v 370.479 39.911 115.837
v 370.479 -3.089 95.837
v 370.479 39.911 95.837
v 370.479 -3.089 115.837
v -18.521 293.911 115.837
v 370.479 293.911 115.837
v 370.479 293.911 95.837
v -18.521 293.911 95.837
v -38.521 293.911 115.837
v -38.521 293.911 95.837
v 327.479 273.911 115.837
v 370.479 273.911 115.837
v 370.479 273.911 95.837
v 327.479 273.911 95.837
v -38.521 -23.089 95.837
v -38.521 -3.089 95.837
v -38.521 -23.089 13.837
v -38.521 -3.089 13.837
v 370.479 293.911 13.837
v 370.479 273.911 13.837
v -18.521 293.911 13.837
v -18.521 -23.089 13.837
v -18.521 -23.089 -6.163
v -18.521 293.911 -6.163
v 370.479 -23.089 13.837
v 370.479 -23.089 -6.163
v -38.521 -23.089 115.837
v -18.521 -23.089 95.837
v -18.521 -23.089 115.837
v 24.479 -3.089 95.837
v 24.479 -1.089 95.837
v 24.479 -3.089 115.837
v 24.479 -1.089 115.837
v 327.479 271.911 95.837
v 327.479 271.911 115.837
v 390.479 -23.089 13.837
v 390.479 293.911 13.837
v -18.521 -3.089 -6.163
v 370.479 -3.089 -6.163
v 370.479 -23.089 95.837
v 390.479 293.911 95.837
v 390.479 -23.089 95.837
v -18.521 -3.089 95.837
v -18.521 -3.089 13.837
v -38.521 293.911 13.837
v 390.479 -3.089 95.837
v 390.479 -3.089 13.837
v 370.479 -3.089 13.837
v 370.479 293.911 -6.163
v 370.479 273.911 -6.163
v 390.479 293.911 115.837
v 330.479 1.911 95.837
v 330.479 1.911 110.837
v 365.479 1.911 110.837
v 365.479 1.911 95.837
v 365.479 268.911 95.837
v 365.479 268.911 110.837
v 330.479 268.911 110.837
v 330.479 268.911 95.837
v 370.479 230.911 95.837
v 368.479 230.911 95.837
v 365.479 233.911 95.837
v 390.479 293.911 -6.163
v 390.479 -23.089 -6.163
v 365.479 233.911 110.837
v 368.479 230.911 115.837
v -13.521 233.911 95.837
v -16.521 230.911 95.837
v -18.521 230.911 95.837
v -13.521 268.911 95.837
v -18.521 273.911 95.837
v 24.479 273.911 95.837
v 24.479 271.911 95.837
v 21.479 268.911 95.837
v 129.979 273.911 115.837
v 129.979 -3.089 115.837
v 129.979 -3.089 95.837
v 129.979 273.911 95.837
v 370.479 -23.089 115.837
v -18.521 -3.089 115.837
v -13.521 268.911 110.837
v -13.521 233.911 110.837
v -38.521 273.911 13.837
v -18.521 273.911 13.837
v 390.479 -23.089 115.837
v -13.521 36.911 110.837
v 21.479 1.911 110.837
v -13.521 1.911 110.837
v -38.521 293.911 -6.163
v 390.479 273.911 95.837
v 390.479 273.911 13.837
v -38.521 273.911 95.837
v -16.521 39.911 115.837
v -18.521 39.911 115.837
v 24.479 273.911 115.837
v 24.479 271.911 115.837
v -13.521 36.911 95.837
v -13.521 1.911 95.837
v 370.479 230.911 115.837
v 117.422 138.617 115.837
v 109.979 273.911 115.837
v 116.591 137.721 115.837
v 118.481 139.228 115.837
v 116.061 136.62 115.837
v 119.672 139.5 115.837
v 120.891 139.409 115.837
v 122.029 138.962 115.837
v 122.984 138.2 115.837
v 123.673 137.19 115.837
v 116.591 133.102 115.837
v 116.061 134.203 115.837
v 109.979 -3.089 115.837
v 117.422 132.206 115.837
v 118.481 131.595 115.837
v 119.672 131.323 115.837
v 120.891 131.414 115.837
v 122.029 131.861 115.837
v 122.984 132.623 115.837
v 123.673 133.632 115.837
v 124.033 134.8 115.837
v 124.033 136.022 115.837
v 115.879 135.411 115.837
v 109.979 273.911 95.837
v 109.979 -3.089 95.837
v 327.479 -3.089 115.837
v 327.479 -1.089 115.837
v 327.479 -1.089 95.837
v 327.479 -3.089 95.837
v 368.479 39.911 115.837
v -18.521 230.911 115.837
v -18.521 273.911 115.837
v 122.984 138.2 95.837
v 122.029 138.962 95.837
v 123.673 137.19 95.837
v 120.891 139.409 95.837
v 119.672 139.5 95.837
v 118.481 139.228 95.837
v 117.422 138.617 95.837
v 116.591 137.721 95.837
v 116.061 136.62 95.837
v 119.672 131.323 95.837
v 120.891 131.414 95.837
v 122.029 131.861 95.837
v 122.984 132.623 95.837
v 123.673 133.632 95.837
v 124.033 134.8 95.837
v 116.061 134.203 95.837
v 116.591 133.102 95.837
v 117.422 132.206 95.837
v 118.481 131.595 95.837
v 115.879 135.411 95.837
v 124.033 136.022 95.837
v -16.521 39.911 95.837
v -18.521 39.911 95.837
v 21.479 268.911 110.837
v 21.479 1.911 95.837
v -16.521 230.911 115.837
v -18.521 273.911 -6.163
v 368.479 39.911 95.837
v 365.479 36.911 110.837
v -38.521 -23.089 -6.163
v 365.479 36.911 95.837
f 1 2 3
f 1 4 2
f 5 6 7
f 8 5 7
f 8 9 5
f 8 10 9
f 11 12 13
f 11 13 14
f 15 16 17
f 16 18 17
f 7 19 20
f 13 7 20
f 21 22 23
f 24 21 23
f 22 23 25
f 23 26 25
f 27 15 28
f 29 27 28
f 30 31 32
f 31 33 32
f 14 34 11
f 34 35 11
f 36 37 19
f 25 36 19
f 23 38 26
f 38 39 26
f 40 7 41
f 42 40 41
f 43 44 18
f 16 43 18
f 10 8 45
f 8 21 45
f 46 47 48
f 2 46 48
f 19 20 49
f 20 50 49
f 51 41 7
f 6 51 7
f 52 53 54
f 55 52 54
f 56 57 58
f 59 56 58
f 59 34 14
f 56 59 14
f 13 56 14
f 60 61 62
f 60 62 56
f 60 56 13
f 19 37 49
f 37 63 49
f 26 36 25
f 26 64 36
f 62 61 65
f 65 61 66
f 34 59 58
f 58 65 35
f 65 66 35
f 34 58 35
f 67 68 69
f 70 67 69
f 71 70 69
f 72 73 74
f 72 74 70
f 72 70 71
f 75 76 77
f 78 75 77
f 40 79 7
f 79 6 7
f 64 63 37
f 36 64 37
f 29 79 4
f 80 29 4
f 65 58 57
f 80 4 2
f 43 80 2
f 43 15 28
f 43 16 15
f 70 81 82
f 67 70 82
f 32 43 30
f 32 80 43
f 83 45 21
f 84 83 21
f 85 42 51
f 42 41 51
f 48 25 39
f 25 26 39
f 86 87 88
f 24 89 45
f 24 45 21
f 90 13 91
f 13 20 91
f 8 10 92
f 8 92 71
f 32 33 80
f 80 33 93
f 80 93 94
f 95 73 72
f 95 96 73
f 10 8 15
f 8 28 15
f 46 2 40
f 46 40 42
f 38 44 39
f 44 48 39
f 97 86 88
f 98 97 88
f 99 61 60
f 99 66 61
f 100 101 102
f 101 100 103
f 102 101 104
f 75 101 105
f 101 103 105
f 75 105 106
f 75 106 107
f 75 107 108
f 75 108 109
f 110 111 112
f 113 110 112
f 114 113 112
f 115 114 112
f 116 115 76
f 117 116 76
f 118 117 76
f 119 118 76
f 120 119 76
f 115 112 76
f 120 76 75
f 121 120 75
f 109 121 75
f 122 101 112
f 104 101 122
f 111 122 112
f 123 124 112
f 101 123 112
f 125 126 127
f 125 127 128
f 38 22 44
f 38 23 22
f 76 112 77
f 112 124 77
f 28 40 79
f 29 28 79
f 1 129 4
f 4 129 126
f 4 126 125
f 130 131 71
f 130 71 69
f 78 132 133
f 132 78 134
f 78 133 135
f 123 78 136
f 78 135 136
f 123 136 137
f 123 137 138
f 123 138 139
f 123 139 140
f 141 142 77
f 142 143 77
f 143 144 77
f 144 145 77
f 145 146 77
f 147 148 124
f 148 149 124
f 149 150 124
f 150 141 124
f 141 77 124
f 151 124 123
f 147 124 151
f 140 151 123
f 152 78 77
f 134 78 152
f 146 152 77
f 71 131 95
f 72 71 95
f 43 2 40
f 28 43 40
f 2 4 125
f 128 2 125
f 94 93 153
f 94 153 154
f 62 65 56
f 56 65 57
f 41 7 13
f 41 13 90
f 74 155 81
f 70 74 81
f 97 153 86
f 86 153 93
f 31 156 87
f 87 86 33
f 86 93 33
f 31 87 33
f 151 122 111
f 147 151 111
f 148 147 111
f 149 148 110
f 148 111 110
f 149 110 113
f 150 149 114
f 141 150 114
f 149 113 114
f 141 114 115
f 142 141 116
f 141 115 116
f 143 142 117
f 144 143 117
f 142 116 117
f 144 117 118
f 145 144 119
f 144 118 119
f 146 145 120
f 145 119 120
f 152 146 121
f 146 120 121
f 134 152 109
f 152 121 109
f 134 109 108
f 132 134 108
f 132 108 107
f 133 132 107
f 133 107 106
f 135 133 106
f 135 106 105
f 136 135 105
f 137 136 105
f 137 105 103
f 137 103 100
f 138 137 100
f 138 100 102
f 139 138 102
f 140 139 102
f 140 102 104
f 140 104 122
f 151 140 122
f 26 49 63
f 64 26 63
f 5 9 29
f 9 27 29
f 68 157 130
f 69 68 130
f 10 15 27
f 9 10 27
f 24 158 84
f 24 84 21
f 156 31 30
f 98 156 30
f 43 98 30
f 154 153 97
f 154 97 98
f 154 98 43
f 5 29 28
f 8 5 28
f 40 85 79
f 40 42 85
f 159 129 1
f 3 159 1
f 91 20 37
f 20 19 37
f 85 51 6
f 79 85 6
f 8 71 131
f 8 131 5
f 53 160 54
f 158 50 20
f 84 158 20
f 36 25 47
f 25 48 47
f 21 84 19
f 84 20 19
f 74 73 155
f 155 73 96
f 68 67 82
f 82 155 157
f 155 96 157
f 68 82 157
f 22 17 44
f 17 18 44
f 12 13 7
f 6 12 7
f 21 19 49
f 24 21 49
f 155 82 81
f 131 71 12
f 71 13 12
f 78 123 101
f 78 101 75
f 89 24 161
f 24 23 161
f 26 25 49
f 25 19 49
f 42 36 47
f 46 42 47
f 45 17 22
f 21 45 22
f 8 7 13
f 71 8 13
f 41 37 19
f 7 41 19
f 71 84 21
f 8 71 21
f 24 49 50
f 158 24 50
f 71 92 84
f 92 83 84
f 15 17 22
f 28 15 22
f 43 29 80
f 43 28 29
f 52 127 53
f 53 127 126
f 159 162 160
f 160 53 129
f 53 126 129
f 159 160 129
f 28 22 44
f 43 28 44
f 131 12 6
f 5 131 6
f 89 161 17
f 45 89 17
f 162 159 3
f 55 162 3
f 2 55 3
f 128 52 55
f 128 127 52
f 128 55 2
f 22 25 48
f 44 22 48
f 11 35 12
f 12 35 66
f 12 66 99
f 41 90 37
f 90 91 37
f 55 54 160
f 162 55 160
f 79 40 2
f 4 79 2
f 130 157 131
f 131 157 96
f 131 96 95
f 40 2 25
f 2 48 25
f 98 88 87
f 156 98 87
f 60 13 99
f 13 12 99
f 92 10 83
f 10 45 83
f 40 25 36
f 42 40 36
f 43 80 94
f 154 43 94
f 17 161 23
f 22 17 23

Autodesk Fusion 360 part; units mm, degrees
sketch "Sketch1" plane through (0, 0, 0) normal (0, 1, 0) x (1, 0, 0)
  line L0 (10, 10) -> (-10, 10)
  line L1 (-10, 10) -> (-10, -10)
  line L2 (-10, -10) -> (10, -10)
  line L3 (10, -10) -> (10, 10)
  line L4 (10, 10) -> (-10, -10) construction
  line L5 (-10, 10) -> (10, -10) construction
  line L6 (20, 10) -> (20, -10)
  line L7 (20, -10) -> (40, -10)
  line L8 (40, -10) -> (40, 10)
  line L9 (40, 10) -> (20, 10)
  line L10 (50, 10) -> (50, -10)
  line L11 (50, -10) -> (70, -10)
  line L12 (70, -10) -> (70, 10)
  line L13 (70, 10) -> (50, 10)
  line L14 (100, 10) -> (80, 10)
  line L15 (80, 10) -> (80, -10)
  line L16 (80, -10) -> (100, -10)
  line L17 (100, -10) -> (100, 10)
  dimension "d1" = 20
  dimension "d2" = 20
  dimension "d5" = 20
  dimension "d6" = 20
  dimension "d9" = 20
  dimension "d10" = 20
  dimension "d145" = 20
  dimension "d146" = 20
extrude "Extrude1" add sketch "Sketch1" along normal blind 317 contours L0 L1 L2 L3 makes body 1
extrude "Extrude2" add sketch "Sketch1" along normal blind 389 separate body contours L6 L7 L8 L9 makes body 2
extrude "Extrude3" add sketch "Sketch1" along normal blind 82 separate body contours L10 L11 L12 L13 makes body 3
extrude "Extrude4" add sketch "Sketch1" along normal blind 277 separate body contours L14 L15 L16 L17 makes body 4
sketch "Sketch2" plane through (0, 0, 10) normal (0, 0, 1) x (-1, 0, 0)
  line L0 (-80, 0) -> (-100, 0)
  line L1 (-100, 0) -> (-100, -277)
  line L2 (-100, -277) -> (-80, -277)
  line L3 (-80, -277) -> (-80, 0)
  line L4 (-100, -277) -> (-80, 0) construction
  circle A0 centre (-90, -138.5) radius 4.1
  dimension "d149" = 8.2
extrude "Extrude5" cut sketch "Sketch2" against normal through all contours A0 bodies 4
copy_body "Body->Comp1" bodies 3 removing the originals makes body 5 in component "Profile_20x20x82"
copy_body "Body->Comp2" bodies 1 removing the originals makes body 6 in component "Profile_20x20x317"
copy_body "Body->Comp3" bodies 2 removing the originals makes body 7 in component "Profile_20x20x389"
copy_body "Body->Comp4" bodies 4 removing the originals makes body 8 in component "Profile_20x20x277"
sketch "Sketch1 (2)" plane through (0, 0, 0) normal (0, 0, 1) x (1, 0, 0) in component "Corner Structure v3"
  line L0 (0, 0) -> (-45, 0)
  line L1 (0, 0) -> (0, 45)
  line L2 (0, 45) -> (-45, 0)
  line L3 (-5, 40) -> (-5, 5)
  line L4 (-5, 5) -> (-40, 5)
  line L5 (-2, 43) -> (0, 43)
  line L6 (-43, 2) -> (-43, 0)
  dimension "d1_1" = 45
  dimension "d2_1" = 45
  dimension "d5_1" = 5
  dimension "d6_1" = 5
  dimension "d7_1" = 2
  dimension "d8_1" = 2
extrude "Extrude2'" add sketch "Sketch1 (2)" along normal blind 20 separate body contours L0 L1 L2 L3 L4 L5 L6 makes body 9 in component "Corner Structure v3"
extrude "Extrude3'" add sketch "Sketch1 (2)" along normal blind 5 contours L2 L3 L4 bodies 9 in component "Corner Structure v3"
sketch "Sketch1 (3)" plane through (0, 0, 0) normal (0, 0, 1) x (1, 0, 0) in component "Corner Structure v3 (1)"
  line L0 (0, 0) -> (-45, 0)
  line L1 (0, 0) -> (0, 45)
  line L2 (0, 45) -> (-45, 0)
  line L3 (-5, 40) -> (-5, 5)
  line L4 (-5, 5) -> (-40, 5)
  line L5 (-2, 43) -> (0, 43)
  line L6 (-43, 2) -> (-43, 0)
  dimension "d1_2" = 45
  dimension "d2_2" = 45
  dimension "d5_2" = 5
  dimension "d6_2" = 5
  dimension "d7_2" = 2
  dimension "d8_2" = 2
extrude "Extrude2''" add sketch "Sketch1 (3)" along normal blind 20 separate body contours L0 L1 L2 L3 L4 L5 L6 makes body 10 in component "Corner Structure v3 (1)"
extrude "Extrude3''" add sketch "Sketch1 (3)" along normal blind 5 contours L2 L3 L4 bodies 10 in component "Corner Structure v3 (1)"
sketch "Sketch1 (4)" plane through (0, 0, 0) normal (0, 0, 1) x (1, 0, 0) in component "Corner Structure v3 (2)"
  line L0 (0, 0) -> (-45, 0)
  line L1 (0, 0) -> (0, 45)
  line L2 (0, 45) -> (-45, 0)
  line L3 (-5, 40) -> (-5, 5)
  line L4 (-5, 5) -> (-40, 5)
  line L5 (-2, 43) -> (0, 43)
  line L6 (-43, 2) -> (-43, 0)
  dimension "d1_3" = 45
  dimension "d2_3" = 45
  dimension "d5_3" = 5
  dimension "d6_3" = 5
  dimension "d7_3" = 2
  dimension "d8_3" = 2
extrude "Extrude2'''" add sketch "Sketch1 (4)" along normal blind 20 separate body contours L0 L1 L2 L3 L4 L5 L6 makes body 11 in component "Corner Structure v3 (2)"
extrude "Extrude3'''" add sketch "Sketch1 (4)" along normal blind 5 contours L2 L3 L4 bodies 11 in component "Corner Structure v3 (2)"
sketch "Sketch1 (5)" plane through (0, 0, 0) normal (0, 0, 1) x (1, 0, 0) in component "Corner Structure v3 (3)"
  line L0 (0, 0) -> (-45, 0)
  line L1 (0, 0) -> (0, 45)
  line L2 (0, 45) -> (-45, 0)
  line L3 (-5, 40) -> (-5, 5)
  line L4 (-5, 5) -> (-40, 5)
  line L5 (-2, 43) -> (0, 43)
  line L6 (-43, 2) -> (-43, 0)
  dimension "d1_4" = 45
  dimension "d2_4" = 45
  dimension "d5_4" = 5
  dimension "d6_4" = 5
  dimension "d7_4" = 2
  dimension "d8_4" = 2
extrude "Extrude2''''" add sketch "Sketch1 (5)" along normal blind 20 separate body contours L0 L1 L2 L3 L4 L5 L6 makes body 12 in component "Corner Structure v3 (3)"
extrude "Extrude3''''" add sketch "Sketch1 (5)" along normal blind 5 contours L2 L3 L4 bodies 12 in component "Corner Structure v3 (3)"
component "Profile_20x20x82" placed x (1, 0, 0) y (0, 0, 1) z (0, -1, 0) at (-88.5214, -13.0886, 13.8372)
component "Profile_20x20x317" placed x (1, 0, 0) y (0, 1, 0) z (0, 0, 1) at (-28.5214, -23.0886, 3.8372)
component "Profile_20x20x389" placed x (0, 1, 0) y (-1, 0, 0) z (0, 0, 1) at (370.4786, -43.0886, 3.8372)
component "Profile_20x20x277" placed x (1, 0, 0) y (0, 1, 0) z (0, 0, 1) at (29.9786, -3.0886, 105.8372)
component "Profile_20x20x317" placed x (-1, 0, 0) y (0, -1, 0) z (0, 0, 1) at (380.4786, 293.9114, 3.8372)
component "Profile_20x20x389" placed x (0, 1, 0) y (-1, 0, 0) z (0, 0, 1) at (370.4786, 253.9114, 3.8372)
component "Profile_20x20x317" placed x (1, 0, 0) y (0, 1, 0) z (0, 0, 1) at (-28.5214, -23.0886, 105.8372)
component "Profile_20x20x389" placed x (0, 1, 0) y (-1, 0, 0) z (0, 0, 1) at (370.4786, -43.0886, 105.8372)
component "Profile_20x20x317" placed x (-1, 0, 0) y (0, -1, 0) z (0, 0, 1) at (380.4786, 293.9114, 105.8372)
component "Profile_20x20x389" placed x (0, 1, 0) y (-1, 0, 0) z (0, 0, 1) at (370.4786, 253.9114, 105.8372)
component "Profile_20x20x82" placed x (1, 0, 0) y (0, 0, 1) z (0, -1, 0) at (320.4786, -13.0886, 13.8372)
component "Profile_20x20x82" placed x (1, 0, 0) y (0, 0, 1) z (0, -1, 0) at (320.4786, 283.9114, 13.8372)
component "Profile_20x20x82" placed x (1, 0, 0) y (0, 0, 1) z (0, -1, 0) at (-88.5214, 283.9114, 13.8372)
component "Corner Structure v3" placed x (0, 1, 0) y (1, 0, 0) z (0, 0, -1) at (-18.5214, 273.9114, 115.8372)
component "Corner Structure v3 (1)" placed x (-1, 0, 0) y (0, 1, 0) z (0, 0, -1) at (-18.5214, -3.0886, 115.8372)
component "Corner Structure v3 (2)" placed x (1, 0, 0) y (0, -1, 0) z (0, 0, -1) at (370.4786, 273.9114, 115.8372)
component "Corner Structure v3 (3)" placed x (0, -1, 0) y (-1, 0, 0) z (0, 0, -1) at (370.4786, -3.0886, 115.8372)
